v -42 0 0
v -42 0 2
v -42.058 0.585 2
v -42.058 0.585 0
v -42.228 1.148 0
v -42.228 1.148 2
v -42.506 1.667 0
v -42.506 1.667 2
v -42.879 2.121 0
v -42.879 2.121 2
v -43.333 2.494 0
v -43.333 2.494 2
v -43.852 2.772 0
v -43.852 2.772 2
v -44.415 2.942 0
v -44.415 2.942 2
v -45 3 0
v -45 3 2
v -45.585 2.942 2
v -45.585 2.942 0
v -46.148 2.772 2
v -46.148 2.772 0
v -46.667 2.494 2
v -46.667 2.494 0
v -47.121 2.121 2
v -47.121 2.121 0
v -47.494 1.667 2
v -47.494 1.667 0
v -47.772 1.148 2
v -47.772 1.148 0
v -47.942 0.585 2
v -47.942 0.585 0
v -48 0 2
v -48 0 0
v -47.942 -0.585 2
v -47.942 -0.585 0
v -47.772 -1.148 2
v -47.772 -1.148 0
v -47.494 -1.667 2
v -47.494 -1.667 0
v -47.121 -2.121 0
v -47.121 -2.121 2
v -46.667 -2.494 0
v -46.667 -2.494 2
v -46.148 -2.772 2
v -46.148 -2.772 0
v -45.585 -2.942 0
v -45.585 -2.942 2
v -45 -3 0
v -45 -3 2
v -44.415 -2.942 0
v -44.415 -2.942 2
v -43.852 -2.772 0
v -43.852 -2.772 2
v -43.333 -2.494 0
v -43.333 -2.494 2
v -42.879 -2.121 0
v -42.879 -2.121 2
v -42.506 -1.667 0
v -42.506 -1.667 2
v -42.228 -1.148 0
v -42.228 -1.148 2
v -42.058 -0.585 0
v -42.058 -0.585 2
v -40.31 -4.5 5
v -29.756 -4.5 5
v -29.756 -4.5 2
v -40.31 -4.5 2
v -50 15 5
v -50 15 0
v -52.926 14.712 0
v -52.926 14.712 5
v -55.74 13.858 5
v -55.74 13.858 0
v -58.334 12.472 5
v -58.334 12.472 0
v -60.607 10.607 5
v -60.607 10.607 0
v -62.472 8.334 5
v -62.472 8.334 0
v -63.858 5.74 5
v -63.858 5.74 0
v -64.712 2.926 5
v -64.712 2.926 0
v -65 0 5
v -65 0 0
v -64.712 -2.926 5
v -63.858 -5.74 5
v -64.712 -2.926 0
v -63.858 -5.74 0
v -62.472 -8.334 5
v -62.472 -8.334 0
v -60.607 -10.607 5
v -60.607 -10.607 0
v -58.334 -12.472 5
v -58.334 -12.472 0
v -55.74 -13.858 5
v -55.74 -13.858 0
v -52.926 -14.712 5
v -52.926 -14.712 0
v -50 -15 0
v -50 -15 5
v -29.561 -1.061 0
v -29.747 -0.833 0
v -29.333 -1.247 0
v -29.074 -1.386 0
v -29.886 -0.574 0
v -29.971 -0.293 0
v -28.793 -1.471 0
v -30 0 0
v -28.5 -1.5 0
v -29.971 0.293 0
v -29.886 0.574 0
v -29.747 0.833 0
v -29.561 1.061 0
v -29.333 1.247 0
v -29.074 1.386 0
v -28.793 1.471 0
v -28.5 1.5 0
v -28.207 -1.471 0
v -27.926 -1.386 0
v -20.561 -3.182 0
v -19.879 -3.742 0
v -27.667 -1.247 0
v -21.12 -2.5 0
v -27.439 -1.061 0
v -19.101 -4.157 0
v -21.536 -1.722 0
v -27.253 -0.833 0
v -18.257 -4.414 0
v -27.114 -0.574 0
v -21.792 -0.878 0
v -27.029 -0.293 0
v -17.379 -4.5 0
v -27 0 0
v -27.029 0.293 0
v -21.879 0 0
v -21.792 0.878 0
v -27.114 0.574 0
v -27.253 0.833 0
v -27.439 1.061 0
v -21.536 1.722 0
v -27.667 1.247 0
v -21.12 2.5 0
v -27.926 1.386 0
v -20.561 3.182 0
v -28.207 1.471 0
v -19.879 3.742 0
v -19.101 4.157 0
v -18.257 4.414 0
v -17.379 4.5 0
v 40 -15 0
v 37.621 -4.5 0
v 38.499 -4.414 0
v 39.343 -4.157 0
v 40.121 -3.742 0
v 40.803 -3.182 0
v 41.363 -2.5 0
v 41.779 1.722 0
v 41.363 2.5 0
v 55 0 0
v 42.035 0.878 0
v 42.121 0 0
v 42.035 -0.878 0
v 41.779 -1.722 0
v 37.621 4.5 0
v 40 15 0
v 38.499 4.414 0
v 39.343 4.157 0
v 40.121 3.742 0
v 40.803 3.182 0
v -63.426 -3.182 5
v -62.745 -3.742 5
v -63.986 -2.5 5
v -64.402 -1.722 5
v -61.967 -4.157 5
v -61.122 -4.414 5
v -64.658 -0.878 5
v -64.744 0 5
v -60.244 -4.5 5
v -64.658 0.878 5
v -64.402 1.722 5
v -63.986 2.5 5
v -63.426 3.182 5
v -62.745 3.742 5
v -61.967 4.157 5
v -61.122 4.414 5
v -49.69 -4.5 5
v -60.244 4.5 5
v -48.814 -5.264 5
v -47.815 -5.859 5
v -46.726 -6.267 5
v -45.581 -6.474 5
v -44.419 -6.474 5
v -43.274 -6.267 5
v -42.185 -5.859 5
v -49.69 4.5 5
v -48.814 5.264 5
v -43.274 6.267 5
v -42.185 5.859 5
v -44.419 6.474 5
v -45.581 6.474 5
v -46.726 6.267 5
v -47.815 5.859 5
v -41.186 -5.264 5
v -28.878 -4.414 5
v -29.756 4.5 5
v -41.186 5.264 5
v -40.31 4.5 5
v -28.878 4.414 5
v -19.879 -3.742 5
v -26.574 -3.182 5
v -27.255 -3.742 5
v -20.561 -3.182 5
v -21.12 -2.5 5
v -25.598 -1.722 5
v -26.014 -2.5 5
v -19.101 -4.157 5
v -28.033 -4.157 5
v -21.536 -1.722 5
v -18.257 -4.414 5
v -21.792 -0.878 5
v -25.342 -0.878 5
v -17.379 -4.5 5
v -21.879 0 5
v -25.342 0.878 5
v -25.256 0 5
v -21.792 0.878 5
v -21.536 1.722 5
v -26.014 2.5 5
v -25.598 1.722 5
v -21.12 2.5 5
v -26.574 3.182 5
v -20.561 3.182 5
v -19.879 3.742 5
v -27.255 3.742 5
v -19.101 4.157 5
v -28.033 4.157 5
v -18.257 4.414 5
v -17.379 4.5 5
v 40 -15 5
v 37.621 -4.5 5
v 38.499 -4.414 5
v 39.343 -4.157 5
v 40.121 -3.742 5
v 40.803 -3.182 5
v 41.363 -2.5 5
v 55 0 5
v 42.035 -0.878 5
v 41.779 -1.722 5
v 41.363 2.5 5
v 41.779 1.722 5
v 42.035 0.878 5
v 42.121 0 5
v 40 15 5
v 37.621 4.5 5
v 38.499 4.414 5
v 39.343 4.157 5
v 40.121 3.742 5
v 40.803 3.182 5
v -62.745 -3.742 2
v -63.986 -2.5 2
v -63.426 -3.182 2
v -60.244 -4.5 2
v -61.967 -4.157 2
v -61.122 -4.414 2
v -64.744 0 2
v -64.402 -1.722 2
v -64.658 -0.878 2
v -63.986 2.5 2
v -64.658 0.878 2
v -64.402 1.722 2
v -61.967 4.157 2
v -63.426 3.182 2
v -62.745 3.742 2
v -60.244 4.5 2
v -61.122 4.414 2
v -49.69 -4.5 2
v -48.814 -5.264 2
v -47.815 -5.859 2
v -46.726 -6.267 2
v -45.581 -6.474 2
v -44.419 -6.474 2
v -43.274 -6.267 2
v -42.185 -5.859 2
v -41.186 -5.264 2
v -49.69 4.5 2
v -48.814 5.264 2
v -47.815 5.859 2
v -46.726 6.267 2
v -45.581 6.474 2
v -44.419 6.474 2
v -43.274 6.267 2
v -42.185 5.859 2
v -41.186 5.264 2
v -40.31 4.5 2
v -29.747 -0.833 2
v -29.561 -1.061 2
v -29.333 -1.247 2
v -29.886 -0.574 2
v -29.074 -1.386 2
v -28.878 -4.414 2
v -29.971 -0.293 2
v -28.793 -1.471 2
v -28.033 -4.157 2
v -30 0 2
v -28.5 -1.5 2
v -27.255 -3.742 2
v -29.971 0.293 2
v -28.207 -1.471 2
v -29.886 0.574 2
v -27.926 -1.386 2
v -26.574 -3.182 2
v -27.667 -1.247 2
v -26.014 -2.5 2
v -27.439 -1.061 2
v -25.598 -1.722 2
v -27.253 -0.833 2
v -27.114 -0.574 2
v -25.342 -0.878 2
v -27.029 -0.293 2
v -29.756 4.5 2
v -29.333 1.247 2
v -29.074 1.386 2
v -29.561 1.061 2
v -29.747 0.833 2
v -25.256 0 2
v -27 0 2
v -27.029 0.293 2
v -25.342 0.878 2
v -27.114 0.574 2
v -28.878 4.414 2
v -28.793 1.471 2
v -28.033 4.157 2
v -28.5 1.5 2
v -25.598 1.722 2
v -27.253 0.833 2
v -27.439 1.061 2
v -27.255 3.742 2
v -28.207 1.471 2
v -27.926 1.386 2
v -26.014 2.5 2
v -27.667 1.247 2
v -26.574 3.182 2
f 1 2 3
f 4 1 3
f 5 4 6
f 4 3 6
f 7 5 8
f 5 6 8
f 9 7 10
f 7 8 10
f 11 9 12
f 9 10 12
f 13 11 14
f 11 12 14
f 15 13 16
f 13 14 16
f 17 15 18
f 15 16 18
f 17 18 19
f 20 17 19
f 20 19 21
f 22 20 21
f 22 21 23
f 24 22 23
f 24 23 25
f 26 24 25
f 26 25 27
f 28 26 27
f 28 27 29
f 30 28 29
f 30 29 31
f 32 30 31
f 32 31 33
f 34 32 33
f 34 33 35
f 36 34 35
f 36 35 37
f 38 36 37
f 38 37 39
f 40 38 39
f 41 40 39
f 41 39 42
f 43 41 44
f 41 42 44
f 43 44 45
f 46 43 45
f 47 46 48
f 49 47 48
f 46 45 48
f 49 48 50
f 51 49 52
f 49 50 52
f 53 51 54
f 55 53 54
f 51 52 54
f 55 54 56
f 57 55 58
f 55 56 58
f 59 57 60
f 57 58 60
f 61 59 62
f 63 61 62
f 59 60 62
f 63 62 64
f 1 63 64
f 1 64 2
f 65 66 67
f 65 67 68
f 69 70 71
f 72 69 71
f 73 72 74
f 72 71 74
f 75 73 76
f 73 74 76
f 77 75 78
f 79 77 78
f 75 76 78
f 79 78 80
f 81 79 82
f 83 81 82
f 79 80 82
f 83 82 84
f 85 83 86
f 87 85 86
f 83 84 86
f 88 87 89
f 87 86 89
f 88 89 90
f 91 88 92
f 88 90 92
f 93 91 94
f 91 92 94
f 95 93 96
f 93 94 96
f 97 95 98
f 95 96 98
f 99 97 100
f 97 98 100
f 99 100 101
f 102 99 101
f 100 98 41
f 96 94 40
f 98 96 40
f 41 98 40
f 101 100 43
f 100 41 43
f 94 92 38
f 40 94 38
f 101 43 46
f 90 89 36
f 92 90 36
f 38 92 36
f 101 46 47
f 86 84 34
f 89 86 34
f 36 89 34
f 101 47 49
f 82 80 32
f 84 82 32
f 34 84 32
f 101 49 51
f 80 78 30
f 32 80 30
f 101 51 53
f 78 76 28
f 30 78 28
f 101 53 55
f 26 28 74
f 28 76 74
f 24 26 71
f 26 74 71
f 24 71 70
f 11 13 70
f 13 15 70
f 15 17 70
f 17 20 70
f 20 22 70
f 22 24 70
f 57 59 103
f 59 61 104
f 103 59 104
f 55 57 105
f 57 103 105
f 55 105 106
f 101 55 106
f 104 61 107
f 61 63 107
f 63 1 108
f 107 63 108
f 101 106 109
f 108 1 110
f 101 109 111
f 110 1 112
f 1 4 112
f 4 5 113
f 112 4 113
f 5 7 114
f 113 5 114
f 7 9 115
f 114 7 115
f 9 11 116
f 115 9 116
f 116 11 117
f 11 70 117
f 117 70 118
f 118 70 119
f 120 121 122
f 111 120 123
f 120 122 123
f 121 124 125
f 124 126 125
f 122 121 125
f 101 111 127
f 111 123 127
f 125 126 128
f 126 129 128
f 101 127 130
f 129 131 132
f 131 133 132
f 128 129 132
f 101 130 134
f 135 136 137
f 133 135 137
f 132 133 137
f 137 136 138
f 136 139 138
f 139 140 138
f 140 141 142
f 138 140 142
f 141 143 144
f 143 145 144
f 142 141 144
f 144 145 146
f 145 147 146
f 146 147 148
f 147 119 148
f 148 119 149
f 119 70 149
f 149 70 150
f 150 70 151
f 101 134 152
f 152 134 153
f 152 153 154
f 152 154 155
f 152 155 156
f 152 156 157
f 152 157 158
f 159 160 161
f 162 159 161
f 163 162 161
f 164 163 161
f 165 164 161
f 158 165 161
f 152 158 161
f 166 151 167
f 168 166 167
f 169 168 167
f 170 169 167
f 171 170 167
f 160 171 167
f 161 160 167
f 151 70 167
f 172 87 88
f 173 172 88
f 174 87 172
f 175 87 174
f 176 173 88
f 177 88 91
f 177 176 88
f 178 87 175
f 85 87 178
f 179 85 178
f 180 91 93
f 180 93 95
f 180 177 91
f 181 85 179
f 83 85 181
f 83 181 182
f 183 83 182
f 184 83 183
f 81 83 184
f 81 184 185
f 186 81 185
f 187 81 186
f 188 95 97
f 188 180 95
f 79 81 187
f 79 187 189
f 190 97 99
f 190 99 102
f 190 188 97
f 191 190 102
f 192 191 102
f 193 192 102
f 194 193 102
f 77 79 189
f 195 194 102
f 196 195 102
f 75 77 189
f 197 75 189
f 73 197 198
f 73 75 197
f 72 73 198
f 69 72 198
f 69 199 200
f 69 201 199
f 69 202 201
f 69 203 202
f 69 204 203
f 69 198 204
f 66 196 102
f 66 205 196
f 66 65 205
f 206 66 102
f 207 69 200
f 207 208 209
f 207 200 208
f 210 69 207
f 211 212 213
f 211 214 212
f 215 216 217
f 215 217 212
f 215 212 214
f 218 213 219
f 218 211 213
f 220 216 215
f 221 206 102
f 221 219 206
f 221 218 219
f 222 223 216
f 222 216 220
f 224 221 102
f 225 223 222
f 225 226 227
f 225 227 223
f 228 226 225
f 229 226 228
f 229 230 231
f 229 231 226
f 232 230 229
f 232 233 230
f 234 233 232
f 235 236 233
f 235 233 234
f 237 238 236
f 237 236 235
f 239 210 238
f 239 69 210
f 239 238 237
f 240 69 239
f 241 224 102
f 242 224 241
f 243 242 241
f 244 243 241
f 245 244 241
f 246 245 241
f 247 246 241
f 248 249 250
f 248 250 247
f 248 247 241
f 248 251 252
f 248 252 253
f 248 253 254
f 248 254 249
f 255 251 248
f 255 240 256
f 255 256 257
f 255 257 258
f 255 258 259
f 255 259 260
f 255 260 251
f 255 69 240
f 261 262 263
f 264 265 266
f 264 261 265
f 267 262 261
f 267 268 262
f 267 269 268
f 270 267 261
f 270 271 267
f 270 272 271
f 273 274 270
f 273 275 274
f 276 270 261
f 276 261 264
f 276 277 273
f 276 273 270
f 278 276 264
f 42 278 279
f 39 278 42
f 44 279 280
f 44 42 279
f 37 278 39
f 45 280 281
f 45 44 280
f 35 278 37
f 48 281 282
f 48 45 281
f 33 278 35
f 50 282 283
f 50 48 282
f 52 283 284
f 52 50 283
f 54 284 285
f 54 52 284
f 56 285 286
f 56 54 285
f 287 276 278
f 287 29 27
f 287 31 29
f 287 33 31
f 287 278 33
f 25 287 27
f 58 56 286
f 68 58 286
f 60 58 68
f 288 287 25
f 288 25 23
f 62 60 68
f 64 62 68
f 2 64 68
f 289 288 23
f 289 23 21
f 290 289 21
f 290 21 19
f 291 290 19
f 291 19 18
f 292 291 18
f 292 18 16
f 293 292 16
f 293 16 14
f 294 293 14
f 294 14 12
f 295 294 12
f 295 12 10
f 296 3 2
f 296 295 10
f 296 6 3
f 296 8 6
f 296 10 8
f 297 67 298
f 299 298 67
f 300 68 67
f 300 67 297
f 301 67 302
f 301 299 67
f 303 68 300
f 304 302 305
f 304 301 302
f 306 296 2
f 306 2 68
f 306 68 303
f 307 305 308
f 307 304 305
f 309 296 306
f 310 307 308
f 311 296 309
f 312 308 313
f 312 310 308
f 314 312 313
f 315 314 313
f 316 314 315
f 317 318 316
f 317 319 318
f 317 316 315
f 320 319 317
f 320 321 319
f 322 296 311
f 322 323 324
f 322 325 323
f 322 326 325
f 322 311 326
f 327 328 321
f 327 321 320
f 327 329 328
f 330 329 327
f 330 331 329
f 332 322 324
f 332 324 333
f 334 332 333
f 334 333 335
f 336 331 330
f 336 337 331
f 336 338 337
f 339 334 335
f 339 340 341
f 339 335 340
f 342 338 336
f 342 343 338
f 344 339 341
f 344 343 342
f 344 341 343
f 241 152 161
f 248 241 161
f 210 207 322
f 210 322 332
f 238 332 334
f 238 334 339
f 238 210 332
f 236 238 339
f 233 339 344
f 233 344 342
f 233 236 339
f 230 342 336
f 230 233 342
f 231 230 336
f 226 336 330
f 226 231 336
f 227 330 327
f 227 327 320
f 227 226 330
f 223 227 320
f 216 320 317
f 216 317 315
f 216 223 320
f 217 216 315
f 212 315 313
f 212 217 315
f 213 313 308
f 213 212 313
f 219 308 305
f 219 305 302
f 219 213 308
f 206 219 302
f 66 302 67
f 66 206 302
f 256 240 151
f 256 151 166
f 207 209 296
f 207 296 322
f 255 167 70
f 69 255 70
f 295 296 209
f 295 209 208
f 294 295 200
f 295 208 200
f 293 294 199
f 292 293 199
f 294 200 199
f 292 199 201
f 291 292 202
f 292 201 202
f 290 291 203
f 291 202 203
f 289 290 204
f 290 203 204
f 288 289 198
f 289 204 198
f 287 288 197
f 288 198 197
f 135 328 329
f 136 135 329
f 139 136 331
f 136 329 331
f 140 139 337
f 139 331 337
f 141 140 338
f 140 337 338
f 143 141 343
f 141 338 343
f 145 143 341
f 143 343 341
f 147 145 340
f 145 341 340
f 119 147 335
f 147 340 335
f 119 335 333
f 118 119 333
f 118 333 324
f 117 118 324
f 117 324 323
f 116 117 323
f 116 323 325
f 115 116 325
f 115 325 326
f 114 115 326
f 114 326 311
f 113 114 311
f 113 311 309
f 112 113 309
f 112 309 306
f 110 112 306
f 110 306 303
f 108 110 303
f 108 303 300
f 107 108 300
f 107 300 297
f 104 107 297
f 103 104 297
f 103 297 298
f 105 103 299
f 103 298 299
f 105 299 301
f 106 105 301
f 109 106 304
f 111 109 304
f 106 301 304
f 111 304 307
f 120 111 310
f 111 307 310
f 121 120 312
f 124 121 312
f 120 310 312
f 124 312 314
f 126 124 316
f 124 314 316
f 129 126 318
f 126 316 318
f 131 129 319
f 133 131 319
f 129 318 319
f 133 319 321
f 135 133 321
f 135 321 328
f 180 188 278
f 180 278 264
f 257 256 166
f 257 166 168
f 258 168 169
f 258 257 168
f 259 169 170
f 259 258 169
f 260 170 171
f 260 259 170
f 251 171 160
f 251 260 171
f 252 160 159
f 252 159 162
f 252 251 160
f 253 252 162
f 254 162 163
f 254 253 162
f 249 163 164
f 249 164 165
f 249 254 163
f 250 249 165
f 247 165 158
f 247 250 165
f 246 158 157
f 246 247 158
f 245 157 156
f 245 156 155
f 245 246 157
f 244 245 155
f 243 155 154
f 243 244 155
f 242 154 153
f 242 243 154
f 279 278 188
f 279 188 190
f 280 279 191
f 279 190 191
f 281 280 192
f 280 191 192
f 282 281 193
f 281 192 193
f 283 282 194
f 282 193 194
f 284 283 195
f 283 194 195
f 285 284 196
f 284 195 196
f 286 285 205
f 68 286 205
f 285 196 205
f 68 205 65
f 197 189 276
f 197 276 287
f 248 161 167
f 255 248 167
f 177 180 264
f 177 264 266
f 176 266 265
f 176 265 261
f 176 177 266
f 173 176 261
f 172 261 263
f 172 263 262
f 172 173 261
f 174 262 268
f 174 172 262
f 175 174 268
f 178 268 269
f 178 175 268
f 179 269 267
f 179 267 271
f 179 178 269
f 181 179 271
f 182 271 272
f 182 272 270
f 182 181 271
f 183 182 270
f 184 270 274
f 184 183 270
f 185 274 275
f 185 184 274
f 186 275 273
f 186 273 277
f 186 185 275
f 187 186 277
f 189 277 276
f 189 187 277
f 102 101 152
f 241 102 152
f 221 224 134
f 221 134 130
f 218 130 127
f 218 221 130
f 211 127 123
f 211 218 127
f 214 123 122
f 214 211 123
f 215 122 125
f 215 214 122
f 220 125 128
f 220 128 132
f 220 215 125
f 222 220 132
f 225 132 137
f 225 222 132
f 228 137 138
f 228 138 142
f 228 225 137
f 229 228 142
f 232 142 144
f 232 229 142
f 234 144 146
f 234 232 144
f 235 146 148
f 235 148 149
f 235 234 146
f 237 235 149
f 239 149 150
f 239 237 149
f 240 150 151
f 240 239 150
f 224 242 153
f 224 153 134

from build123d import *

# Parameters (mm, degrees)
BOSS_EXTRUDE1_DEPTH = 5
SKETCH2_R           = 3
SKETCH2_R_2         = 1.5
CUT_EXTRUDE1_DEPTH  = 5
SKETCH3_R           = 6.5
CUT_EXTRUDE2_DEPTH  = 3
CUT_EXTRUDE3_DEPTH  = 3
CUT_EXTRUDE4_DEPTH  = 5


with BuildPart() as part:
    # Sketch1 → Boss-Extrude1 (new body)
    with BuildSketch(Plane.XY):
        with BuildLine():
            Line((40, -15), (55, 0))
            Line((55, 0), (40, 15))
            Line((40, 15), (-50, 15))
            ThreePointArc((-50, 15), (-65, 0), (-50, -15))
            Line((-50, -15), (40, -15))
        make_face()
    extrude(amount=BOSS_EXTRUDE1_DEPTH)

    # Sketch2 → Cut-Extrude1 (cut)
    with BuildSketch(Plane.XY.offset(5)):
        with Locations((-45, 0)):
            Circle(SKETCH2_R)
        with Locations((-28.5, 0)):
            Circle(SKETCH2_R_2)
    extrude(amount=-CUT_EXTRUDE1_DEPTH, mode=Mode.SUBTRACT)

    # Sketch3 → Cut-Extrude2 (cut)
    with BuildSketch(Plane.XY.offset(5)):
        with Locations((-45, 0)):
            Circle(SKETCH3_R)
    extrude(amount=-CUT_EXTRUDE2_DEPTH, mode=Mode.SUBTRACT)

    # Sketch4 → Cut-Extrude3 (cut)
    with BuildSketch(Plane.XY.offset(5)):
        with BuildLine():
            Line((-29.755535663, -4.5), (-60.244464337, -4.5))
            ThreePointArc((-60.244464337, -4.5), (-64.744464337, 0), (-60.244464337, 4.5))
            Line((-60.244464337, 4.5), (-29.755535663, 4.5))
            ThreePointArc((-29.755535663, 4.5), (-25.255535663, 0), (-29.755535663, -4.5))
        make_face()
    extrude(amount=-CUT_EXTRUDE3_DEPTH, mode=Mode.SUBTRACT)

    # Sketch6 → Cut-Extrude4 (cut)
    with BuildSketch(Plane.XY.offset(5)):
        with BuildLine():
            Line((-17.3786019, 4.5), (37.6213981, 4.5))
            ThreePointArc((37.6213981, 4.5), (42.1213981, 0), (37.6213981, -4.5))
            Line((37.6213981, -4.5), (-17.3786019, -4.5))
            ThreePointArc((-17.3786019, -4.5), (-21.8786019, 0), (-17.3786019, 4.5))
        make_face()
    extrude(amount=-CUT_EXTRUDE4_DEPTH, mode=Mode.SUBTRACT)


solid = part.part
